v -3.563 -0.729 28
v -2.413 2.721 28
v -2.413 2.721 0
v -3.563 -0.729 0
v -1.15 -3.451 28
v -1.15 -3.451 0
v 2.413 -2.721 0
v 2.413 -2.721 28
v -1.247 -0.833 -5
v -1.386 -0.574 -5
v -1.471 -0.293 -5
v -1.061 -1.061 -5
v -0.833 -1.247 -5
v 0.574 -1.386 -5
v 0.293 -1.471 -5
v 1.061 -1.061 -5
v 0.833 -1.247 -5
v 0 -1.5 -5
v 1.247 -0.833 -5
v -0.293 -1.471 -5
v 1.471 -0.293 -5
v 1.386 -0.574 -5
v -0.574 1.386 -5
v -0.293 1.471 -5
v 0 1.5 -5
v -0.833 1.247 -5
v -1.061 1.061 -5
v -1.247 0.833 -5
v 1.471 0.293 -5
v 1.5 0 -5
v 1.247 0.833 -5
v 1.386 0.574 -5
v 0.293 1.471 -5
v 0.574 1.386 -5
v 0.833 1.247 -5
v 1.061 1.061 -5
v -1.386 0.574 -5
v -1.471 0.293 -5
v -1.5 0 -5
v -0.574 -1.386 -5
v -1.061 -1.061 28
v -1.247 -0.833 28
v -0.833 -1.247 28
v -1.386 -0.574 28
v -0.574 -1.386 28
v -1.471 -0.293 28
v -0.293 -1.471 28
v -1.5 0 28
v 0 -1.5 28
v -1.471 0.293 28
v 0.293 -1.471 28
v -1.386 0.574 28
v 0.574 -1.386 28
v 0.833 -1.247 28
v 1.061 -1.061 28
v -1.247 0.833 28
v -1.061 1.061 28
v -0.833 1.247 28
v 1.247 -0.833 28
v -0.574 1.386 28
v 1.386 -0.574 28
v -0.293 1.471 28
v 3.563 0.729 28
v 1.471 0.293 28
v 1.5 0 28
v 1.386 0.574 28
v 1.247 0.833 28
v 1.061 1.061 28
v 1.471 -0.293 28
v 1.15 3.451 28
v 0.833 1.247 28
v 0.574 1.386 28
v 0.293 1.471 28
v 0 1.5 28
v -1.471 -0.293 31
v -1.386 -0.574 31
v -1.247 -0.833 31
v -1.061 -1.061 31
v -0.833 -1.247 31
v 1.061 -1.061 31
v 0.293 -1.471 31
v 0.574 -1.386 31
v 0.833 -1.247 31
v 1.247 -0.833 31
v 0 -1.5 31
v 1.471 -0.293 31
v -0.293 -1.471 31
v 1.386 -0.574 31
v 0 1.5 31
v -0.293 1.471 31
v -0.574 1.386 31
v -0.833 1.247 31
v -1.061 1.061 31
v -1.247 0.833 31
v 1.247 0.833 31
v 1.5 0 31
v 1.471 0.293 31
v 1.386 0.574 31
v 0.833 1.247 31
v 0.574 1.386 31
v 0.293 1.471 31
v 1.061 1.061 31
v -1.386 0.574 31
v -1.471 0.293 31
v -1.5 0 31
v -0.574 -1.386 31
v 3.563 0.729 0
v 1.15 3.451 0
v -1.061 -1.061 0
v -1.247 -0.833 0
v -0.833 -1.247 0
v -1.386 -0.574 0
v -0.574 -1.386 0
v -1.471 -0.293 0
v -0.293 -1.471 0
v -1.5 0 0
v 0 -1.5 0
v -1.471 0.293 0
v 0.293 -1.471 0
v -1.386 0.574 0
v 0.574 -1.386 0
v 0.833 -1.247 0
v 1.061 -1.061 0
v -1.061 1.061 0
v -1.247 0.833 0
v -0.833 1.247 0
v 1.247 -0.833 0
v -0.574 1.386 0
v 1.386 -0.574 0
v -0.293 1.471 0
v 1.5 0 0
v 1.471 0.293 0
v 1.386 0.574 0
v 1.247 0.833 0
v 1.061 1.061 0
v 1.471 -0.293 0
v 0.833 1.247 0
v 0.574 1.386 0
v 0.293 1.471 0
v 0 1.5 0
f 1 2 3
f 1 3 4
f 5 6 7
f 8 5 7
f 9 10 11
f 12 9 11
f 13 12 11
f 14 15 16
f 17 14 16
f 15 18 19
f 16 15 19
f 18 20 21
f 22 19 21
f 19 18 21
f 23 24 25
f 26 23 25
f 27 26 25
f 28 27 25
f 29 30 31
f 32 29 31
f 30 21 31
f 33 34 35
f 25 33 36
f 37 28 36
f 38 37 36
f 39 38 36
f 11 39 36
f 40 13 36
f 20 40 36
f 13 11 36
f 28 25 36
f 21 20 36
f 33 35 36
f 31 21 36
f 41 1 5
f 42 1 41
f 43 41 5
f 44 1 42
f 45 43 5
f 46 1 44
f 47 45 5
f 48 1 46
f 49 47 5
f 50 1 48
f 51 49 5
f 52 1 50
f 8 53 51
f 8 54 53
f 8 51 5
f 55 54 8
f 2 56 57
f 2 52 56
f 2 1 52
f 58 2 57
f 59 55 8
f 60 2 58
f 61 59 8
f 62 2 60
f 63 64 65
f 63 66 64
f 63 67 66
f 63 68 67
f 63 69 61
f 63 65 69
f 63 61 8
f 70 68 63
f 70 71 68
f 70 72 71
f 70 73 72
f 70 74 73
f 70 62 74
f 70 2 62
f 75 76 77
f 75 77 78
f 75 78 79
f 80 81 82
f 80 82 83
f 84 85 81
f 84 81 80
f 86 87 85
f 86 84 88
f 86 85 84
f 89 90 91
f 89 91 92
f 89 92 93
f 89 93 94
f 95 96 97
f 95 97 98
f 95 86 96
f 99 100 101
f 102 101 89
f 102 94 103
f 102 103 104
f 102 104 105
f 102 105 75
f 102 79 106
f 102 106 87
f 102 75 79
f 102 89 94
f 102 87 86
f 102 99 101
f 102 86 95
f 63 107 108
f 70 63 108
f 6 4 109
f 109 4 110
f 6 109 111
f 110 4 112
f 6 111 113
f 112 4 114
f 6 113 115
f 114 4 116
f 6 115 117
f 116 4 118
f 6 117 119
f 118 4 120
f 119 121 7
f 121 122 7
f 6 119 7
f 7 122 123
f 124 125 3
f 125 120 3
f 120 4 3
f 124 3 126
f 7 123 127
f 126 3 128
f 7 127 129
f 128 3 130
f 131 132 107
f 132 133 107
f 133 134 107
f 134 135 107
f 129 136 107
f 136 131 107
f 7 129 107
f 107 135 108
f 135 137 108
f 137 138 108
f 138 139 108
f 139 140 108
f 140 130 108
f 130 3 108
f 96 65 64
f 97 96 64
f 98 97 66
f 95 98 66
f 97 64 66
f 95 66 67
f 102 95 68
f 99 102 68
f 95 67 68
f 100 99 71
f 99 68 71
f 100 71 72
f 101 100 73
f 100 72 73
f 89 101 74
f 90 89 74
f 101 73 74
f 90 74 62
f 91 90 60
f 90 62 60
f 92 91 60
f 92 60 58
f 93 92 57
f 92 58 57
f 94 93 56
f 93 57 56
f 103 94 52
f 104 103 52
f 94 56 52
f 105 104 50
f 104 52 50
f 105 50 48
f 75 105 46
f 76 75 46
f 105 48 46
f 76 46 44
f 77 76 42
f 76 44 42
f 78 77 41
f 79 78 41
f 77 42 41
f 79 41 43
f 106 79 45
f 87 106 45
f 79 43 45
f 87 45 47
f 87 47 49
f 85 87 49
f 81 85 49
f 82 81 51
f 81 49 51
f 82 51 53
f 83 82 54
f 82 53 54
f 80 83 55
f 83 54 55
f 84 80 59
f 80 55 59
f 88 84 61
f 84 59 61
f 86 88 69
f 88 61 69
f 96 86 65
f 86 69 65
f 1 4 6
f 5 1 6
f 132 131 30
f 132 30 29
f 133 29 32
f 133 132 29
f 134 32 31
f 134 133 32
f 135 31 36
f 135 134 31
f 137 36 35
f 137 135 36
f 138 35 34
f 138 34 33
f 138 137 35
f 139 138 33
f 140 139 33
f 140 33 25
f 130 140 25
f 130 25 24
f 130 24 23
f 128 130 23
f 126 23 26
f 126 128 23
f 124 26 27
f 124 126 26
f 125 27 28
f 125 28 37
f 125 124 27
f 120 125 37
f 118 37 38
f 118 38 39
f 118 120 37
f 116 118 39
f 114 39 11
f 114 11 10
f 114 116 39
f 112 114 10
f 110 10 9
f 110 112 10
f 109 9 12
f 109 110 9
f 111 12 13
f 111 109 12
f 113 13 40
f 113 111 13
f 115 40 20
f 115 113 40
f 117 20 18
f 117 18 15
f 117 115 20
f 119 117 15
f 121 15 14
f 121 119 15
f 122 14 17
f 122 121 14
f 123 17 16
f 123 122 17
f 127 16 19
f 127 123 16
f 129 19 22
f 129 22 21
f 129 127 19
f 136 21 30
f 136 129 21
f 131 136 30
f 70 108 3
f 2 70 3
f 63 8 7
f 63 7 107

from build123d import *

# Parameters (mm, degrees)
F0_R     = 1.5
F1_DEPTH = 28
F2_DEPTH = 5
F3_R     = 1.5
F4_DEPTH = 3


with BuildPart() as f1:
    # F0 (on Top) → F1 (new body)
    with BuildSketch(Plane.XY):
        Polygon((2.413244, -2.721443), (3.563461, 0.729209), (1.150217, 3.450652), (-2.413244, 2.721443), (-3.563461, -0.729209), (-1.150217, -3.450652), align=None)
        Circle(F0_R, mode=Mode.SUBTRACT)
        Circle(F0_R)
    extrude(amount=F1_DEPTH)

    # F0 (on Top) → F2 (join)
    with BuildSketch(Plane.XY):
        Circle(F0_R)
    extrude(amount=-F2_DEPTH)

    # F3 (on face) → F4 (join)
    with BuildSketch(Plane.XY.offset(28)):
        Circle(F3_R)
    extrude(amount=F4_DEPTH)


solid = f1.part
